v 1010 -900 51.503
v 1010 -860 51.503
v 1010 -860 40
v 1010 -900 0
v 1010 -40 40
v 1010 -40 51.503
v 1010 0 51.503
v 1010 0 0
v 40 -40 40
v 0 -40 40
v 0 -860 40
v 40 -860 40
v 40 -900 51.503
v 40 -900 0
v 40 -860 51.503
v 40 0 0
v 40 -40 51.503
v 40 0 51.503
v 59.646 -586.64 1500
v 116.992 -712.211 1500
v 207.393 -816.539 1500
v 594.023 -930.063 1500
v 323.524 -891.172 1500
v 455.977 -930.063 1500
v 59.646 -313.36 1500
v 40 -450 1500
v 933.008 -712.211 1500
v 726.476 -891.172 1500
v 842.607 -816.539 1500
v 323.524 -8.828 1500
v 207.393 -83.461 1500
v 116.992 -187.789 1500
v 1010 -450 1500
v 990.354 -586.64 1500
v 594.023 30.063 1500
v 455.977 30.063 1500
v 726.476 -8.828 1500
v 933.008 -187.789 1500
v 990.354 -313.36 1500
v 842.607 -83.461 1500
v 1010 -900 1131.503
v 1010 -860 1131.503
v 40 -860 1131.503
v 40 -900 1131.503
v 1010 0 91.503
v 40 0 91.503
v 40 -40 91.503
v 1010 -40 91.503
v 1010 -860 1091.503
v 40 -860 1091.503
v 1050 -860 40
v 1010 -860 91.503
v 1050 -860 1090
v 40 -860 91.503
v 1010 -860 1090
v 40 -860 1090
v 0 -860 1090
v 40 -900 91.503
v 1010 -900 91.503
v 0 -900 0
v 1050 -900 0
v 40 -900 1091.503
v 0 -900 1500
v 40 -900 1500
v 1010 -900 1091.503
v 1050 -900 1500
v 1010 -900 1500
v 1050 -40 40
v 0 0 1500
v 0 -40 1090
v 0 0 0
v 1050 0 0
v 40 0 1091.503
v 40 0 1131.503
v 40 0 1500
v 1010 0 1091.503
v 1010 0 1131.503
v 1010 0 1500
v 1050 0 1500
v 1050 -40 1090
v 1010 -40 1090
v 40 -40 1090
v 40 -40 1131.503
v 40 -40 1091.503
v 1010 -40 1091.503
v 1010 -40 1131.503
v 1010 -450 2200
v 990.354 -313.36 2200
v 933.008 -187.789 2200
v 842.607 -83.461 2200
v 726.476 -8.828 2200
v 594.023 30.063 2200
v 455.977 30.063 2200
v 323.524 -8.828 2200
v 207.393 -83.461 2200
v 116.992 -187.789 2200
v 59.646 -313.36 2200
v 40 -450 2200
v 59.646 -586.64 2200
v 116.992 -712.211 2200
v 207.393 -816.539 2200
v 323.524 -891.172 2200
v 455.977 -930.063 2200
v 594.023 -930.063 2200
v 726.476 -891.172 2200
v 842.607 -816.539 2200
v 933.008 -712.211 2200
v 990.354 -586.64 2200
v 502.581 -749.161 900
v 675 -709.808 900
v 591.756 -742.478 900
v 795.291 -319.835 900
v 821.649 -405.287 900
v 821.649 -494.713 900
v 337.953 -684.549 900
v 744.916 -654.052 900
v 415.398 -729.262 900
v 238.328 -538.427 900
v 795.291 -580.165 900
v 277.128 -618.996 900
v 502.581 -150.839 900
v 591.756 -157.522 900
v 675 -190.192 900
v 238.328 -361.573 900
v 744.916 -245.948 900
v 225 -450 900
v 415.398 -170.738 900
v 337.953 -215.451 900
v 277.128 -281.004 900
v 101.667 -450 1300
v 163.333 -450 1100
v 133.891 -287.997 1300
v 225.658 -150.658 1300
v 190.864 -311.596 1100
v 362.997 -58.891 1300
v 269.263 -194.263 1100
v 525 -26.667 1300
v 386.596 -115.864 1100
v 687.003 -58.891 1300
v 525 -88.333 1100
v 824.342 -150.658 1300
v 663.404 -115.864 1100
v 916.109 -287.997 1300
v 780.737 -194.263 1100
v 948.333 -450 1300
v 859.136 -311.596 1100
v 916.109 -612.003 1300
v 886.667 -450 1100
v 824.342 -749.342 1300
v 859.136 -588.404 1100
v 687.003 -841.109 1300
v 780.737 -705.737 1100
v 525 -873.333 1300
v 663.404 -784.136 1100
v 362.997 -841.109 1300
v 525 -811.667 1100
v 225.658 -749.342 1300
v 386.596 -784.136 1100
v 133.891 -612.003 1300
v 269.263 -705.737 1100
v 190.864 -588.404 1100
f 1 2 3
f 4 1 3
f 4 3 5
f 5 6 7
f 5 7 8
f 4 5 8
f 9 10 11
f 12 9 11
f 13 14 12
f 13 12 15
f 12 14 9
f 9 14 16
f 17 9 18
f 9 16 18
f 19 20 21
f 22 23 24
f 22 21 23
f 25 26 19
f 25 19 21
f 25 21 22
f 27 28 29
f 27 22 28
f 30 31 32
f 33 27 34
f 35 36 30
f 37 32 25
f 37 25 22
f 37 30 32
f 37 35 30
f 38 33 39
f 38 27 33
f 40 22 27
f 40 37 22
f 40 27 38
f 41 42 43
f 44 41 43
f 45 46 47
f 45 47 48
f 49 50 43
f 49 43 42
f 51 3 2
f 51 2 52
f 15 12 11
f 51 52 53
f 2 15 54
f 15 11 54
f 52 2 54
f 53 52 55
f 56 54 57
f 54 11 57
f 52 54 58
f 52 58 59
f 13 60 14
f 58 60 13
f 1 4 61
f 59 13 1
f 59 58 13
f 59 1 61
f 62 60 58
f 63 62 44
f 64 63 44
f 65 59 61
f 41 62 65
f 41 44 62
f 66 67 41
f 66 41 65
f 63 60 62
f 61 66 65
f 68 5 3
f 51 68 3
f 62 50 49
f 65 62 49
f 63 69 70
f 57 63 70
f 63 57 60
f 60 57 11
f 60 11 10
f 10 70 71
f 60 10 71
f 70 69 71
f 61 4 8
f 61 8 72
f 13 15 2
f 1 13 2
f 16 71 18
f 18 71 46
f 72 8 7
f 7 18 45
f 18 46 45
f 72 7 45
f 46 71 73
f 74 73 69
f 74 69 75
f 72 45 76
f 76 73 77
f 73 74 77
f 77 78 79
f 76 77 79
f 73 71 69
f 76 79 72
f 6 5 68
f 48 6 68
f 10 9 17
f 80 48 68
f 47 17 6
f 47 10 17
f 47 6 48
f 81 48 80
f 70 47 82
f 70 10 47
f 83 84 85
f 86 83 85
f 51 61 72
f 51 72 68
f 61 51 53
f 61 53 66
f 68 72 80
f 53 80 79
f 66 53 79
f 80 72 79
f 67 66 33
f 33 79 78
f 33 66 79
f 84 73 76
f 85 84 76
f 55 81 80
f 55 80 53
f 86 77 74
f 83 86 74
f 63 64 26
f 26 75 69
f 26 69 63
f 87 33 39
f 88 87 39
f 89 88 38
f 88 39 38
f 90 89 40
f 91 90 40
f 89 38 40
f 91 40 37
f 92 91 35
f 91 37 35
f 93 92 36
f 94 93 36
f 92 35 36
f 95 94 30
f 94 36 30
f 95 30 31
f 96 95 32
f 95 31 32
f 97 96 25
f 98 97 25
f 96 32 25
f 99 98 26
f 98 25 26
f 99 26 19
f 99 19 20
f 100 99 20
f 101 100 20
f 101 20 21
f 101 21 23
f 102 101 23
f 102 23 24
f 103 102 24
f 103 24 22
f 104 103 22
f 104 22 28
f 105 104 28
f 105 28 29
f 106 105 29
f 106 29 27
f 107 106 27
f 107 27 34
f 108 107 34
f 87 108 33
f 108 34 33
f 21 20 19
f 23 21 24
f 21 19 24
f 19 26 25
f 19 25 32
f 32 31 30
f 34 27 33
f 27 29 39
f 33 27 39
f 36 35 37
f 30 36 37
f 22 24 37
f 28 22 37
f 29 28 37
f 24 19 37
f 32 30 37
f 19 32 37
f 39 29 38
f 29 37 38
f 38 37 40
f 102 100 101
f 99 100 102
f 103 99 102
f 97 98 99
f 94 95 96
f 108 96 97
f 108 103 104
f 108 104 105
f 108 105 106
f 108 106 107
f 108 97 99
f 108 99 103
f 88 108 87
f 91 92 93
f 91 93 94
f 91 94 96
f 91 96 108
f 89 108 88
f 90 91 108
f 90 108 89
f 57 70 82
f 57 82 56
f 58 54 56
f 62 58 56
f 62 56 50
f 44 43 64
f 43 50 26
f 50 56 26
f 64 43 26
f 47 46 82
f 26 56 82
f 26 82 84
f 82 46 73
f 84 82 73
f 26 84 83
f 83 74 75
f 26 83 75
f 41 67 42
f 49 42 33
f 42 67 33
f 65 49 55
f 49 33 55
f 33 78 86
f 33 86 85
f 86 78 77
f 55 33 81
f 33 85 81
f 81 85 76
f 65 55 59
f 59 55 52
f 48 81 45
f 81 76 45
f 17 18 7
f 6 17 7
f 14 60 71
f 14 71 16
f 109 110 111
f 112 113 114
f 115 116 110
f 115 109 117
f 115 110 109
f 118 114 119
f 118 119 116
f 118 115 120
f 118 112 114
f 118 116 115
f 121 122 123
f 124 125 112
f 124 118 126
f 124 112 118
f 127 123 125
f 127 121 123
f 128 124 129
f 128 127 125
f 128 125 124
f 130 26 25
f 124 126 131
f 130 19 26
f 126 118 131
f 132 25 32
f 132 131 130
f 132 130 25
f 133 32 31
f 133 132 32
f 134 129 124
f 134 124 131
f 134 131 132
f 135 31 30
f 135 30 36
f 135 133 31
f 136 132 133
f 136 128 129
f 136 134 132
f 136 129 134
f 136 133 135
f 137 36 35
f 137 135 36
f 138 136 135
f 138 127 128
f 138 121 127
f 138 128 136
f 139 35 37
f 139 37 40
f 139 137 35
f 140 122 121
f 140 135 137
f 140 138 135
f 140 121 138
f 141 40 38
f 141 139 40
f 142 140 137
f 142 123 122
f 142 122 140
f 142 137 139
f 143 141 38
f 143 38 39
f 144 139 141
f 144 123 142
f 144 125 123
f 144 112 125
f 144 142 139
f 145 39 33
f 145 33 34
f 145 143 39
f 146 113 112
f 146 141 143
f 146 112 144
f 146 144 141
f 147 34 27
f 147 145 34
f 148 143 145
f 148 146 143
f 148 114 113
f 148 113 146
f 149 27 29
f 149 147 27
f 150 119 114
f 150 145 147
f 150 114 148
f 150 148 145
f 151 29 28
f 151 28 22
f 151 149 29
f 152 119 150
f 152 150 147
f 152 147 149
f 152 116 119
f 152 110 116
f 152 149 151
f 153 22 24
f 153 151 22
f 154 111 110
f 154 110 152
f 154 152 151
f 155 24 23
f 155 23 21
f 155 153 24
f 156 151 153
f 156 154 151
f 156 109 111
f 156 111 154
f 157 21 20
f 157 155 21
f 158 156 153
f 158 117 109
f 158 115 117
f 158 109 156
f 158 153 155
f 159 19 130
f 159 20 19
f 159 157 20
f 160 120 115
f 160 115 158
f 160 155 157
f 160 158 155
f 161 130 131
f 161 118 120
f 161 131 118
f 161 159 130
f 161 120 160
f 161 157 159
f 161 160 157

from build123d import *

# Parameters (mm, degrees)
F0_W      = 970
F0_H      = 1000
F1_DEPTH  = 900
F2_W      = 970
F2_H      = 820
F3_DEPTH  = 1448.4977711683
F4_R      = 485
F5_DEPTH  = 700
F9_W      = 820
F9_H      = 1050
F10_DEPTH = 1050.001


with BuildPart() as f1:
    # F0 (on Front) → F1 (new body)
    with BuildSketch(Plane.XZ):
        Polygon((0, 1500), (0, 0), (40, 0), (40, 51.5032288317), (1010, 51.5032288317), (1010, 0), (1050, 0), (1050, 1500), (1010, 1500), (1010, 1131.5032288317), (40, 1131.5032288317), (40, 1500), align=None)
        with Locations((525, 591.5032288317)):
            Rectangle(F0_W, F0_H, mode=Mode.SUBTRACT)
    extrude(amount=F1_DEPTH)

    # F2 (on face) → F3 (cut, through all)
    with BuildSketch(Plane(origin=(0, 0, 51.5032288317), x_dir=(1, 0, 0), z_dir=(0, 0, -1))):
        with Locations((525, 450)):
            Rectangle(F2_W, F2_H)
    extrude(amount=-F3_DEPTH, mode=Mode.SUBTRACT)

    # F4 (on face) → F5 (join)
    with BuildSketch(Plane.XY.offset(1500)):
        with Locations((525, -450)):
            Circle(F4_R)
    extrude(amount=F5_DEPTH)

    # F9 (on face) → F10 (cut, through all)
    with BuildSketch(Plane(origin=(0, 0, 0), x_dir=(0, -1, 0), z_dir=(-1, 0, 0))):
        with Locations((450, 565)):
            Rectangle(F9_W, F9_H)
    extrude(amount=-F10_DEPTH, mode=Mode.SUBTRACT)


with BuildPart() as f8:
    # F7 (on offset) → F8 (revolve)
    with BuildSketch(Plane.XZ.offset(450)):
        Polygon((525, 900), (525, 1500), (40, 1500), (225, 900), align=None)
    revolve(axis=Axis((525, -450, 1200), (0, 0, -1)))


solid = Compound([f1.part, f8.part])
